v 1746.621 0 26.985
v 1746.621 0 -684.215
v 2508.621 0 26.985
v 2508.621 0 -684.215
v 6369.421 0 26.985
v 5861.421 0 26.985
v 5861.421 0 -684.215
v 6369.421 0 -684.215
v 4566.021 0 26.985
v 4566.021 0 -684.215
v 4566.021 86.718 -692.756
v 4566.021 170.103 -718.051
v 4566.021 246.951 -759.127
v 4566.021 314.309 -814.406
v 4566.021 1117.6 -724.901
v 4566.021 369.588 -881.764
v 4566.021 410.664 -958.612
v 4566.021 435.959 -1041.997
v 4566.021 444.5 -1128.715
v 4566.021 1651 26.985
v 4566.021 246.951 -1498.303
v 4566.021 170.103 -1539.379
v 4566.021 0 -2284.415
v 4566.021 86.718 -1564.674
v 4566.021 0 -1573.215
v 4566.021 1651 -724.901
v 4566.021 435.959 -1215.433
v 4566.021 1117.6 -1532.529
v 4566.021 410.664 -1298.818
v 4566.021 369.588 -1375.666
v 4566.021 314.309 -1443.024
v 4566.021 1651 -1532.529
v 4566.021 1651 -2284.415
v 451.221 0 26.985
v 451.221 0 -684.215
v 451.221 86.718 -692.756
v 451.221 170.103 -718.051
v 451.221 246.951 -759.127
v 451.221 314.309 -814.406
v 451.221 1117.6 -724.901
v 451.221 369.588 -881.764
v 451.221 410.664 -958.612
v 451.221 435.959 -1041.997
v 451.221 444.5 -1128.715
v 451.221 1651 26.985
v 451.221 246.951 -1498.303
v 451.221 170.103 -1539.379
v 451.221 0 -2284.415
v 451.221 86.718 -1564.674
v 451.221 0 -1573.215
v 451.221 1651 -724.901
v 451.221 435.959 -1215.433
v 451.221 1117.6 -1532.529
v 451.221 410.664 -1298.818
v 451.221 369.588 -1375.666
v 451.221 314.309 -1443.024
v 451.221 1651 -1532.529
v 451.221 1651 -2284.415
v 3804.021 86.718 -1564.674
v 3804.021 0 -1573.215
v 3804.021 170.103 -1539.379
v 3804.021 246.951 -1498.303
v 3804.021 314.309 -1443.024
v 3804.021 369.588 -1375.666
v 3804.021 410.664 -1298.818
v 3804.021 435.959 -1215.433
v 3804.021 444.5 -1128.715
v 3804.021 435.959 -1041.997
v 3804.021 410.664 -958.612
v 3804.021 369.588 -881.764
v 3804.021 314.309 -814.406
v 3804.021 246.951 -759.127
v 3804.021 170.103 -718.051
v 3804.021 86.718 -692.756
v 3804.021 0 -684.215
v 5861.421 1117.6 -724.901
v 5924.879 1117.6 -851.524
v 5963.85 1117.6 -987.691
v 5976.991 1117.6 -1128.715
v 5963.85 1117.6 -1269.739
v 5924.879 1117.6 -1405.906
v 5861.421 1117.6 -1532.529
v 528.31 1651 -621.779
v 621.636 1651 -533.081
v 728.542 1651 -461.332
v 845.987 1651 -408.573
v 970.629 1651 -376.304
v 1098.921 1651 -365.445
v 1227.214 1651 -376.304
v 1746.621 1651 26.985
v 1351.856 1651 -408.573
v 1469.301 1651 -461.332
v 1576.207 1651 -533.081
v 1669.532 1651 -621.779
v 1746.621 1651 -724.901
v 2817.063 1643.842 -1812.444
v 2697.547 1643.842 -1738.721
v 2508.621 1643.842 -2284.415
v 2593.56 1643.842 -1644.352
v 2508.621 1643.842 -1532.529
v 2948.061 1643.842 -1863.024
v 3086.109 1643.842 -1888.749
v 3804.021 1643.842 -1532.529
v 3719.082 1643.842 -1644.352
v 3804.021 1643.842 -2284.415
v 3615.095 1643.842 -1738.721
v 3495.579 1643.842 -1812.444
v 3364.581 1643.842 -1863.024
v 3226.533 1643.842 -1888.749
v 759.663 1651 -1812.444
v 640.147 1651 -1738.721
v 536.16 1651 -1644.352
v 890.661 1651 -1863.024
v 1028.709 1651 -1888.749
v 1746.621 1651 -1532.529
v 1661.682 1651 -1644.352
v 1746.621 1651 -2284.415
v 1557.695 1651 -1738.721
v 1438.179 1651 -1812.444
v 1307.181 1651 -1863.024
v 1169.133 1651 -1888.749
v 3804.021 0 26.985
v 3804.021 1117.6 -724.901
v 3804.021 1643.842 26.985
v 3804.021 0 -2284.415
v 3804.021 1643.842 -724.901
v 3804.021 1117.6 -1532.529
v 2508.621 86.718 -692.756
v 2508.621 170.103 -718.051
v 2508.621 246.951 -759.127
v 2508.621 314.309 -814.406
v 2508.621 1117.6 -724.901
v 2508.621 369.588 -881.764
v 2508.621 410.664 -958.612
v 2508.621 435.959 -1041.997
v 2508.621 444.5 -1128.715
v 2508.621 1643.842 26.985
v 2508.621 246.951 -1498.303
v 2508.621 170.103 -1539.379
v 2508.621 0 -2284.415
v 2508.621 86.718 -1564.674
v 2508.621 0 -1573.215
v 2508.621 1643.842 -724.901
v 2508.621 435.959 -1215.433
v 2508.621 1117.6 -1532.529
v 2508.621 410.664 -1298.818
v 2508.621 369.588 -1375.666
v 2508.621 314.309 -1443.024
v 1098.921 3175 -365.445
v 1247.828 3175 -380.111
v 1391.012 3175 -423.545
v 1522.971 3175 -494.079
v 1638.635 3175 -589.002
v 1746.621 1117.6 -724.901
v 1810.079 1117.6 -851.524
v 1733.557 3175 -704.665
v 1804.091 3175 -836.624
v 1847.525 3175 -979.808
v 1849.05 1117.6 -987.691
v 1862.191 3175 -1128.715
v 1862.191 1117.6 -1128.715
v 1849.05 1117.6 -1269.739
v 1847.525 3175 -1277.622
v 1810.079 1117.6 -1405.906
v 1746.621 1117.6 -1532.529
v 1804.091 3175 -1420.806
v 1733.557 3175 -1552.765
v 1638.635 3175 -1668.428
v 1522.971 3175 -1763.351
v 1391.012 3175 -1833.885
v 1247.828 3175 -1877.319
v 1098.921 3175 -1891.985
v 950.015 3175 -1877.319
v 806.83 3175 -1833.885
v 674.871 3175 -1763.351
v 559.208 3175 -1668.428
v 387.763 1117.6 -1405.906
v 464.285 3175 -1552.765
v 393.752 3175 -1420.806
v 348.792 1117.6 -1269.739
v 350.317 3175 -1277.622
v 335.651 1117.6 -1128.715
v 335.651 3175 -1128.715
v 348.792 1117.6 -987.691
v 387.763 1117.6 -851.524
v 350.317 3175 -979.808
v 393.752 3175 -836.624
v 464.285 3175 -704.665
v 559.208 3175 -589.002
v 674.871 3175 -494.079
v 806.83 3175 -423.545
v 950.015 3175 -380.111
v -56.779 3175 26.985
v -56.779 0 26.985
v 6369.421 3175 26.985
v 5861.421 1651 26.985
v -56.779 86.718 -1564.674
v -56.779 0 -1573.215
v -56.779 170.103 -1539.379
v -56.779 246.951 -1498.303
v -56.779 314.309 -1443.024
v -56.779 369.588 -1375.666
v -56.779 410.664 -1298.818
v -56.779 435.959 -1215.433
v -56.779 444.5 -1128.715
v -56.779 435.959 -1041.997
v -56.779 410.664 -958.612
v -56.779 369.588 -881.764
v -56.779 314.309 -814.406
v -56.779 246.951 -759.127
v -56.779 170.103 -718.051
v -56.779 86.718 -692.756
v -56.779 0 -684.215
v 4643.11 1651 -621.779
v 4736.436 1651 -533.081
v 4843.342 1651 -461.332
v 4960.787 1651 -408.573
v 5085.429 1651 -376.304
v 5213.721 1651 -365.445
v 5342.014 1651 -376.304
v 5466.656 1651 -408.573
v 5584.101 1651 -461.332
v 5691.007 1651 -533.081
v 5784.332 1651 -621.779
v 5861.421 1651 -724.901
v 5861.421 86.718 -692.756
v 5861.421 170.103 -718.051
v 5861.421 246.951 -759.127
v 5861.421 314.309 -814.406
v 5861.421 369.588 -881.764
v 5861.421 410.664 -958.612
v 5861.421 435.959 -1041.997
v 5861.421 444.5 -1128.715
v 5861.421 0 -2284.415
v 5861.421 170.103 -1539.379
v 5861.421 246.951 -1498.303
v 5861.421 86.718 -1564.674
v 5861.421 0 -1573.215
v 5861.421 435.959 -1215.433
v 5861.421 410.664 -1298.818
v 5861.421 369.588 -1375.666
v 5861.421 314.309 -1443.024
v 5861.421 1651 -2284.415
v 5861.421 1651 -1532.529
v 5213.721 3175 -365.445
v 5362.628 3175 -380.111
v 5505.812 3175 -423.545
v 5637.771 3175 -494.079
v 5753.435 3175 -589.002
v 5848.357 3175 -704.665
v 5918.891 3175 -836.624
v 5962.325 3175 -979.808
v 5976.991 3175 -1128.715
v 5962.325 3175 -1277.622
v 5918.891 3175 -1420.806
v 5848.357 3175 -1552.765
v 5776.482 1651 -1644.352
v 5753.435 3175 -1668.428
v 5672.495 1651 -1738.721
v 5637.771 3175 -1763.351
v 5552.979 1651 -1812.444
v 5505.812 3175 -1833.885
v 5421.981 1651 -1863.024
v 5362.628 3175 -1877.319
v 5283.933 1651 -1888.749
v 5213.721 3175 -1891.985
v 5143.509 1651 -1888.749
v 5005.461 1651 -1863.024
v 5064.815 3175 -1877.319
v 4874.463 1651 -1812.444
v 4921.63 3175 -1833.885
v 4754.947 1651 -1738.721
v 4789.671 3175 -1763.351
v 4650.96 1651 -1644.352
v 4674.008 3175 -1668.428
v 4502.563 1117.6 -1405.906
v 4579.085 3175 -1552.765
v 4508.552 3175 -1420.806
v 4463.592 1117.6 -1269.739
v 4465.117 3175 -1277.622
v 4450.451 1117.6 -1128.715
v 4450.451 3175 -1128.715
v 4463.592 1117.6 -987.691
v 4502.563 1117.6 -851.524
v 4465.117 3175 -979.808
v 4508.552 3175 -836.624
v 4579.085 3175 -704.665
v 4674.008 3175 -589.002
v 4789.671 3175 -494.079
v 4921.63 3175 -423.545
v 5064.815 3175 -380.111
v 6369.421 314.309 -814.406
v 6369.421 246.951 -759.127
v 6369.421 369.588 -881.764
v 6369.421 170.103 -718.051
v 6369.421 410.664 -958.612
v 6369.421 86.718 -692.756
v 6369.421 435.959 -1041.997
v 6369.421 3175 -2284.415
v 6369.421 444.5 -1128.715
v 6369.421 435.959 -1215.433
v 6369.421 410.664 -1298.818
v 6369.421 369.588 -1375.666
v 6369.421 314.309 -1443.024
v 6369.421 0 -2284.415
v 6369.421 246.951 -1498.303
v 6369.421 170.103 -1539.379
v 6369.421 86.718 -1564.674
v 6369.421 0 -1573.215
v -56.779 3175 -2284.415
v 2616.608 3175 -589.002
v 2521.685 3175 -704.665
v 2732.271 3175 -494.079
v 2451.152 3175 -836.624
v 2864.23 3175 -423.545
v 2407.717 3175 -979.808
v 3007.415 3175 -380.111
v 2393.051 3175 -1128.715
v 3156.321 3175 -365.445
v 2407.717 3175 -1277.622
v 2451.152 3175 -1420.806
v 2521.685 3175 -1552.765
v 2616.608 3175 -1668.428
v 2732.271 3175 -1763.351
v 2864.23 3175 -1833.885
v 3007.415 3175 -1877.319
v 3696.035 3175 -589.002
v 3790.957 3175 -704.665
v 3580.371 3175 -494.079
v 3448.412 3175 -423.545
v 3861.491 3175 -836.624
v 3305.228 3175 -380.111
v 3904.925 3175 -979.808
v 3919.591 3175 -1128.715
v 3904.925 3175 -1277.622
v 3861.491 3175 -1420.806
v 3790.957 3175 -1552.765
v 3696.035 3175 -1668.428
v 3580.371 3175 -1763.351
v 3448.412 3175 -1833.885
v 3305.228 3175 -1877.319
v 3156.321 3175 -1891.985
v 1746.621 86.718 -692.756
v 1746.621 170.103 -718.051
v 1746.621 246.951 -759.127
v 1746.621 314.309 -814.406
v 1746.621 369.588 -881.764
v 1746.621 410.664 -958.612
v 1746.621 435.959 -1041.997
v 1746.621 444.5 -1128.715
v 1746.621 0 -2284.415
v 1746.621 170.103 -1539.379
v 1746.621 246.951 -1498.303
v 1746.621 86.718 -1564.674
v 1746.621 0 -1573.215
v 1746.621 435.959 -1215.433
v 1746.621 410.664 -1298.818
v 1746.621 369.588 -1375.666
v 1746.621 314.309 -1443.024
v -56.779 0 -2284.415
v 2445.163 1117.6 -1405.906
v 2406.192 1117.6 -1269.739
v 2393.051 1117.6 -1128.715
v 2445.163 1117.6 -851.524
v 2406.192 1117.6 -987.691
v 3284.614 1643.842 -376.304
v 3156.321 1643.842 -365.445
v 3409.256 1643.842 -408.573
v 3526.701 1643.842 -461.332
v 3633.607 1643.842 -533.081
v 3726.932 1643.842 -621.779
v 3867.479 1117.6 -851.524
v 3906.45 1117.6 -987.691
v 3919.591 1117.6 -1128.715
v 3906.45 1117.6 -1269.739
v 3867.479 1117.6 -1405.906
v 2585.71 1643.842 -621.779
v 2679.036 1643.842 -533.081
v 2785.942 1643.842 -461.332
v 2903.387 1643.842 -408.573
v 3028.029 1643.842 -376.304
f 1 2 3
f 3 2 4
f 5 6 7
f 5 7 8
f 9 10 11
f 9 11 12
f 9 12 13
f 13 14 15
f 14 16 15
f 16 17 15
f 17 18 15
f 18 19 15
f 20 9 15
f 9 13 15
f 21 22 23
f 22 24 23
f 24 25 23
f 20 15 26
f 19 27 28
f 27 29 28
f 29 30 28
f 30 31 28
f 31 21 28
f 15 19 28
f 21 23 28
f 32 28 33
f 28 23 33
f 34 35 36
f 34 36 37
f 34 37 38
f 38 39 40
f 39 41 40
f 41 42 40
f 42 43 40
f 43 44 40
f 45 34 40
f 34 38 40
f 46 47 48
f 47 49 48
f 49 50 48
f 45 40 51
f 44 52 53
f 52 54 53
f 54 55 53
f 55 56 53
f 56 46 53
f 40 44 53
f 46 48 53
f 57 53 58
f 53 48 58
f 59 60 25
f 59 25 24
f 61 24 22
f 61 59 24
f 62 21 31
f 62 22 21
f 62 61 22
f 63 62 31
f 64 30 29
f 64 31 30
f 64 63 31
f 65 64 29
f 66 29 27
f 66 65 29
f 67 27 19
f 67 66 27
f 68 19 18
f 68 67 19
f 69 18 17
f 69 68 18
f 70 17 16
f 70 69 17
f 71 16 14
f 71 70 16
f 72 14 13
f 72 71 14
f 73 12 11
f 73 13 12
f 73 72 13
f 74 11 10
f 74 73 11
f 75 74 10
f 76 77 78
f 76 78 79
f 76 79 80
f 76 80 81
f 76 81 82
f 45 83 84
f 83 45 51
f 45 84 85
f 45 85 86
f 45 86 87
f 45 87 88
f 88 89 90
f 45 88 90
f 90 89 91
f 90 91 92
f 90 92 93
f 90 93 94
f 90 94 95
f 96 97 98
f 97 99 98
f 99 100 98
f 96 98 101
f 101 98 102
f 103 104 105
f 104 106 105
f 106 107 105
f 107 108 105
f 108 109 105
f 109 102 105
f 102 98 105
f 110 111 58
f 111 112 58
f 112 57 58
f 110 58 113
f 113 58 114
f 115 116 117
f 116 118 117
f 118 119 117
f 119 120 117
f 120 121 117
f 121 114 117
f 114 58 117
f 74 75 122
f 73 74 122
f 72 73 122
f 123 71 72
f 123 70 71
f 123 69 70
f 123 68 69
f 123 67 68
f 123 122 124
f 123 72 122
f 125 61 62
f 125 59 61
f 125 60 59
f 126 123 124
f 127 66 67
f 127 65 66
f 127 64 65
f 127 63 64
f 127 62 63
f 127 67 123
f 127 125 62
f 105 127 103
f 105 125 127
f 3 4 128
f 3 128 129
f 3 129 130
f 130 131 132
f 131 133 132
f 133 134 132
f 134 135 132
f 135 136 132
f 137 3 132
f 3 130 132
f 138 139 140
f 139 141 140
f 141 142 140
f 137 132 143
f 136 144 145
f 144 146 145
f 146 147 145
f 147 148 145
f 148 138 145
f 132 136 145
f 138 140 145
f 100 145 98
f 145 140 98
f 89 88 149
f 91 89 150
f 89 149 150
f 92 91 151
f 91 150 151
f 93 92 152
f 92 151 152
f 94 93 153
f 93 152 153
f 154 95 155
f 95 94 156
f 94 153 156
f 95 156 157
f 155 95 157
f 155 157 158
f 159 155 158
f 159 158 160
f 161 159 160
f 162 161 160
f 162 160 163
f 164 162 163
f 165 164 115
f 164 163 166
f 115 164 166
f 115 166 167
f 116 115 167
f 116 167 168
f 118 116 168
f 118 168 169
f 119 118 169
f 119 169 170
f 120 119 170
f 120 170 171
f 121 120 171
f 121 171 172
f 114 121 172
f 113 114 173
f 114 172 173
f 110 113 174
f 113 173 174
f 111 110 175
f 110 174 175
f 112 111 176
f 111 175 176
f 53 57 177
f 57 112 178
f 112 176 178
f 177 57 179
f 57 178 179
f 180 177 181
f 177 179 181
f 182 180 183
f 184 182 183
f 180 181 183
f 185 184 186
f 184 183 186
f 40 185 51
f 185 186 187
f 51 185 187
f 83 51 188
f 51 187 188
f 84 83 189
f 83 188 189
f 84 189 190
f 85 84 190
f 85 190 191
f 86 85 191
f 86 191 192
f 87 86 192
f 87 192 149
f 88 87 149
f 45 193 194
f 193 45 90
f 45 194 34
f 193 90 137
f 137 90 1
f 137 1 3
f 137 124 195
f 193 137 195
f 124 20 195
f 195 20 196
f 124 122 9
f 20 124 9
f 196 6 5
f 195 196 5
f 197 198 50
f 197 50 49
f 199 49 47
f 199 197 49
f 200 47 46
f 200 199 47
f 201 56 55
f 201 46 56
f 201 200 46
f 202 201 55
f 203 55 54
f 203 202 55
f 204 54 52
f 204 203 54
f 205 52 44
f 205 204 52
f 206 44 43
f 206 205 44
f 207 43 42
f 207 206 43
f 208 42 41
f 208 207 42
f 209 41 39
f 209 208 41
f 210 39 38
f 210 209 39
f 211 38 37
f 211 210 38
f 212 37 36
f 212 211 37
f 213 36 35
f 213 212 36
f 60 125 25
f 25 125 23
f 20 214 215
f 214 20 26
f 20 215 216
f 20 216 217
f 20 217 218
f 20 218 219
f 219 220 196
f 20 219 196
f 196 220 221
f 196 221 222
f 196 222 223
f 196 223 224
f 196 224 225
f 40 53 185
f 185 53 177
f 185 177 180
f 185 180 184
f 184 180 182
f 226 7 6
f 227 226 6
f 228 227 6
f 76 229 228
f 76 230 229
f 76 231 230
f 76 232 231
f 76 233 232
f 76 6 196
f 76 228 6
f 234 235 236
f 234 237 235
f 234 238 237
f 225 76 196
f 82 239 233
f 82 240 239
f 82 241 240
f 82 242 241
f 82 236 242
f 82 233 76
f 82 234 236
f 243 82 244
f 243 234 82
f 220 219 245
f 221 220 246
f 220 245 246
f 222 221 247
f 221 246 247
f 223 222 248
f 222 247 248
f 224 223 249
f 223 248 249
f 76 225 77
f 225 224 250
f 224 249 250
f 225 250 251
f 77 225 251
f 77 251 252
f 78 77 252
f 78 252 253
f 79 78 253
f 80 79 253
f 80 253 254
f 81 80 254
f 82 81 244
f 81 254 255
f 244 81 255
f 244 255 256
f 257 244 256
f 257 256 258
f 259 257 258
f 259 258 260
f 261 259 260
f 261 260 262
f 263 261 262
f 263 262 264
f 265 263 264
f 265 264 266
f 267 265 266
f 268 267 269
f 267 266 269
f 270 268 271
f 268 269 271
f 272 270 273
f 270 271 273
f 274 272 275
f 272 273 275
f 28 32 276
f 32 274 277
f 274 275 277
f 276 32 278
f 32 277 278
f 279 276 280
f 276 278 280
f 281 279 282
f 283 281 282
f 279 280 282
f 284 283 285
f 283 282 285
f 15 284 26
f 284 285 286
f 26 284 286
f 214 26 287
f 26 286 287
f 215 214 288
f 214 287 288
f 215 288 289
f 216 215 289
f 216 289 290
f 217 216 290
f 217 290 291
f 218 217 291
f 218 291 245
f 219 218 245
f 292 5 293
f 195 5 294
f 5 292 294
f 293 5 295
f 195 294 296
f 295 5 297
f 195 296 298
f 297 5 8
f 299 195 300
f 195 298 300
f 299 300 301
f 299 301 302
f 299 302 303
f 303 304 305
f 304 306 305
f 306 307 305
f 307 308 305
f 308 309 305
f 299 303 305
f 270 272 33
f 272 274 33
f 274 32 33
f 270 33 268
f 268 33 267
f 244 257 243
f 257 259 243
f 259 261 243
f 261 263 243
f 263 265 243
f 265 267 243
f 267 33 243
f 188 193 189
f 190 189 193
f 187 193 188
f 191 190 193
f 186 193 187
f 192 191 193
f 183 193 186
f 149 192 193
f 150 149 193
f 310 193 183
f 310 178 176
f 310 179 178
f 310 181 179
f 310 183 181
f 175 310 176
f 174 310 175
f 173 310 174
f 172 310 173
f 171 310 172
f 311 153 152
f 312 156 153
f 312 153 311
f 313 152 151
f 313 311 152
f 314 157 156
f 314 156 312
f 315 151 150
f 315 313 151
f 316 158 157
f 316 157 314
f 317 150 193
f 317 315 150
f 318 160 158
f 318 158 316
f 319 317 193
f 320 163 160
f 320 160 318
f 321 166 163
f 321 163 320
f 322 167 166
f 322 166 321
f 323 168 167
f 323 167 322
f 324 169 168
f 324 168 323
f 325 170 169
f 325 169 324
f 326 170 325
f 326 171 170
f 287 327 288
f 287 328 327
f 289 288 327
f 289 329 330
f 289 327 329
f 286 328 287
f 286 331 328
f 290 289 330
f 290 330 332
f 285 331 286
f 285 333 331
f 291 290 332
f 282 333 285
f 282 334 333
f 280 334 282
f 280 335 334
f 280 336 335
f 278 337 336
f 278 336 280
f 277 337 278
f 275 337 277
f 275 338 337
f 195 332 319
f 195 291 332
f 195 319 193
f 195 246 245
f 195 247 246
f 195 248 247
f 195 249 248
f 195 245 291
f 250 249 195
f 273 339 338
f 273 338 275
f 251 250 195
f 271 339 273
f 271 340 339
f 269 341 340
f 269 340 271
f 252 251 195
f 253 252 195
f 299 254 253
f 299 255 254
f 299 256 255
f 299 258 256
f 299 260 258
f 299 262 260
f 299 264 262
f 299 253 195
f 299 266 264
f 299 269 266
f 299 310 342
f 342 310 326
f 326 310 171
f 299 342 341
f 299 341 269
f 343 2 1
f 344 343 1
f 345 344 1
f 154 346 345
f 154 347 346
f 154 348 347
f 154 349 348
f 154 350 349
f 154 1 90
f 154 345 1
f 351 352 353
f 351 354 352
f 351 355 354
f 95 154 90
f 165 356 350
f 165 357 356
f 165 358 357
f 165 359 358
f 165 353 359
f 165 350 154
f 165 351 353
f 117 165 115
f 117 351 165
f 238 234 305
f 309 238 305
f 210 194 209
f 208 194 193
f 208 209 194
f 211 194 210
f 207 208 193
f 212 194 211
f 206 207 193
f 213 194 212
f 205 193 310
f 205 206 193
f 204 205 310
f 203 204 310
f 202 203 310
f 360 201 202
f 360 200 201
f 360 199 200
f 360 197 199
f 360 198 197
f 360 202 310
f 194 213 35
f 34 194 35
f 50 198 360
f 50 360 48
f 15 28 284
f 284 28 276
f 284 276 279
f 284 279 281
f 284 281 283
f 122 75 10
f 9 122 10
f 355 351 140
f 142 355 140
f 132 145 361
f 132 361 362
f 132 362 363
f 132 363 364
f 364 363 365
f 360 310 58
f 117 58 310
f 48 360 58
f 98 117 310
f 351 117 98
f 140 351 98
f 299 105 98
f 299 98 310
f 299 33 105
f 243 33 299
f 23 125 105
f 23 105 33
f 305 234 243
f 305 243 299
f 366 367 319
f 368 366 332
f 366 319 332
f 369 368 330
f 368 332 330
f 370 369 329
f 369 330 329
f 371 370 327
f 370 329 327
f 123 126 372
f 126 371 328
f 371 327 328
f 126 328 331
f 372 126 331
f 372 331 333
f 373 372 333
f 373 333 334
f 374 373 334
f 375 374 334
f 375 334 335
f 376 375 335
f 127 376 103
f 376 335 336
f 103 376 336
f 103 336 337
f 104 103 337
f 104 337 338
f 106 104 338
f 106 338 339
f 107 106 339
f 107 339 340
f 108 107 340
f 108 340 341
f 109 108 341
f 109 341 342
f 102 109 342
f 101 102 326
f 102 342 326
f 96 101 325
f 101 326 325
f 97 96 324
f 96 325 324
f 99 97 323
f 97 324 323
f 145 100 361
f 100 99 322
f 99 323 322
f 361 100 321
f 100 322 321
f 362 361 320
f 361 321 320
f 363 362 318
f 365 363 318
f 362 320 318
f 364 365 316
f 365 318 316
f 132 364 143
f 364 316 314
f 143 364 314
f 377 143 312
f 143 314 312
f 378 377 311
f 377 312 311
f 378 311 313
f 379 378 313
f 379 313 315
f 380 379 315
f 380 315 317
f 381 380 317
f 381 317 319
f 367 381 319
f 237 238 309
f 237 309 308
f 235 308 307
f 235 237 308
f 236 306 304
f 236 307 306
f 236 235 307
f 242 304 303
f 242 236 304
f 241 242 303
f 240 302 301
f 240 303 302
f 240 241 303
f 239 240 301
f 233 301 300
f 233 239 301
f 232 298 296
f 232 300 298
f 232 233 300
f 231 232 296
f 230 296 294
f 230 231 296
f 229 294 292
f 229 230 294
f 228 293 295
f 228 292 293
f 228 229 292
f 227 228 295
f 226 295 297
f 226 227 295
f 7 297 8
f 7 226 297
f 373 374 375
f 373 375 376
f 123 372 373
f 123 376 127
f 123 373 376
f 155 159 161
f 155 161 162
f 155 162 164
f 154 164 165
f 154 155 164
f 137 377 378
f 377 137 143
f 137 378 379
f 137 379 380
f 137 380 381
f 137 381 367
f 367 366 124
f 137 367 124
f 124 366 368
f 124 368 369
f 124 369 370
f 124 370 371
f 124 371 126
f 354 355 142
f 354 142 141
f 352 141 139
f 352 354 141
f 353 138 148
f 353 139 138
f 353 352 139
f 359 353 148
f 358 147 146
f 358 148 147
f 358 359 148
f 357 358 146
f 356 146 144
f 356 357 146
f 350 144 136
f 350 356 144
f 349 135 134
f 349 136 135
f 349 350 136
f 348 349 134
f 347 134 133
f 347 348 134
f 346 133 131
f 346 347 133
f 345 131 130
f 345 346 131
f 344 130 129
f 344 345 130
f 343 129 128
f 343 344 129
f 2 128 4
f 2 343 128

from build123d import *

# Parameters (mm, degrees)
SKETCH1_W               = 6426.2
SKETCH1_H               = 2311.4
BOSS_EXTRUDE1_DEPTH     = 3175
SKETCH2_R               = 763.27
CUT_EXTRUDE1_DEPTH      = 2057.4
CUT_EXTRUDE3_DEPTH      = 7475.536972742
CUT_EXTRUDE3_DEPTH_BACK = 7475.536972742
SKETCH6_W               = 1295.4
SKETCH6_H               = 1651
CUT_EXTRUDE4_DEPTH      = 7523.97968682
CUT_EXTRUDE4_DEPTH_BACK = 7523.97968682
SKETCH7_R               = 444.5


with BuildPart() as part:
    # Sketch1 → Boss-Extrude1 (new body)
    with BuildSketch(Plane(origin=(0, 0, 0), x_dir=(1, 0, 0), z_dir=(0, 1, 0))):
        with Locations((3156.321169036, 1128.715007899)):
            Rectangle(SKETCH1_W, SKETCH1_H)
    extrude(amount=BOSS_EXTRUDE1_DEPTH)

    # Sketch2 → Cut-Extrude1 (cut)
    with BuildSketch(Plane(origin=(0, 3175, 0), x_dir=(1, 0, 0), z_dir=(0, 1, 0))):
        with Locations(Location((1098.921169036, 1128.715007899, 0), (0, 0, 270))):
            Circle(SKETCH2_R)
        with Locations(Location((3156.321169036, 1128.715007899, 0), (0, 0, 270))):
            Circle(SKETCH2_R)
        with Locations(Location((5213.721169036, 1128.715007899, 0), (0, 0, 270))):
            Circle(SKETCH2_R)
    extrude(amount=-CUT_EXTRUDE1_DEPTH, mode=Mode.SUBTRACT)

    # Sketch6 → Cut-Extrude3 (cut, two sides: drawn at the far end of the back side and taken through both)
    with BuildSketch(Plane.XY.offset(-CUT_EXTRUDE3_DEPTH_BACK)):
        with Locations((3156.321169036, 818.341718397)):
            Rectangle(SKETCH6_W, SKETCH6_H)
        with Locations((5213.721169036, 825.5)):
            Rectangle(SKETCH6_W, SKETCH6_H)
        with Locations((1098.921169036, 825.5)):
            Rectangle(SKETCH6_W, SKETCH6_H)
    extrude(amount=CUT_EXTRUDE3_DEPTH + CUT_EXTRUDE3_DEPTH_BACK, mode=Mode.SUBTRACT)

    # Sketch7 → Cut-Extrude4 (cut, two sides: drawn at the far end of the back side and taken through both)
    with BuildSketch(Plane(origin=(6369.421169036, 0, 0), x_dir=(0, 0, -1), z_dir=(1, 0, 0)).offset(-CUT_EXTRUDE4_DEPTH_BACK)):
        with Locations((1128.715007899, 0)):
            Circle(SKETCH7_R)
    extrude(amount=CUT_EXTRUDE4_DEPTH + CUT_EXTRUDE4_DEPTH_BACK, mode=Mode.SUBTRACT)


solid = part.part
